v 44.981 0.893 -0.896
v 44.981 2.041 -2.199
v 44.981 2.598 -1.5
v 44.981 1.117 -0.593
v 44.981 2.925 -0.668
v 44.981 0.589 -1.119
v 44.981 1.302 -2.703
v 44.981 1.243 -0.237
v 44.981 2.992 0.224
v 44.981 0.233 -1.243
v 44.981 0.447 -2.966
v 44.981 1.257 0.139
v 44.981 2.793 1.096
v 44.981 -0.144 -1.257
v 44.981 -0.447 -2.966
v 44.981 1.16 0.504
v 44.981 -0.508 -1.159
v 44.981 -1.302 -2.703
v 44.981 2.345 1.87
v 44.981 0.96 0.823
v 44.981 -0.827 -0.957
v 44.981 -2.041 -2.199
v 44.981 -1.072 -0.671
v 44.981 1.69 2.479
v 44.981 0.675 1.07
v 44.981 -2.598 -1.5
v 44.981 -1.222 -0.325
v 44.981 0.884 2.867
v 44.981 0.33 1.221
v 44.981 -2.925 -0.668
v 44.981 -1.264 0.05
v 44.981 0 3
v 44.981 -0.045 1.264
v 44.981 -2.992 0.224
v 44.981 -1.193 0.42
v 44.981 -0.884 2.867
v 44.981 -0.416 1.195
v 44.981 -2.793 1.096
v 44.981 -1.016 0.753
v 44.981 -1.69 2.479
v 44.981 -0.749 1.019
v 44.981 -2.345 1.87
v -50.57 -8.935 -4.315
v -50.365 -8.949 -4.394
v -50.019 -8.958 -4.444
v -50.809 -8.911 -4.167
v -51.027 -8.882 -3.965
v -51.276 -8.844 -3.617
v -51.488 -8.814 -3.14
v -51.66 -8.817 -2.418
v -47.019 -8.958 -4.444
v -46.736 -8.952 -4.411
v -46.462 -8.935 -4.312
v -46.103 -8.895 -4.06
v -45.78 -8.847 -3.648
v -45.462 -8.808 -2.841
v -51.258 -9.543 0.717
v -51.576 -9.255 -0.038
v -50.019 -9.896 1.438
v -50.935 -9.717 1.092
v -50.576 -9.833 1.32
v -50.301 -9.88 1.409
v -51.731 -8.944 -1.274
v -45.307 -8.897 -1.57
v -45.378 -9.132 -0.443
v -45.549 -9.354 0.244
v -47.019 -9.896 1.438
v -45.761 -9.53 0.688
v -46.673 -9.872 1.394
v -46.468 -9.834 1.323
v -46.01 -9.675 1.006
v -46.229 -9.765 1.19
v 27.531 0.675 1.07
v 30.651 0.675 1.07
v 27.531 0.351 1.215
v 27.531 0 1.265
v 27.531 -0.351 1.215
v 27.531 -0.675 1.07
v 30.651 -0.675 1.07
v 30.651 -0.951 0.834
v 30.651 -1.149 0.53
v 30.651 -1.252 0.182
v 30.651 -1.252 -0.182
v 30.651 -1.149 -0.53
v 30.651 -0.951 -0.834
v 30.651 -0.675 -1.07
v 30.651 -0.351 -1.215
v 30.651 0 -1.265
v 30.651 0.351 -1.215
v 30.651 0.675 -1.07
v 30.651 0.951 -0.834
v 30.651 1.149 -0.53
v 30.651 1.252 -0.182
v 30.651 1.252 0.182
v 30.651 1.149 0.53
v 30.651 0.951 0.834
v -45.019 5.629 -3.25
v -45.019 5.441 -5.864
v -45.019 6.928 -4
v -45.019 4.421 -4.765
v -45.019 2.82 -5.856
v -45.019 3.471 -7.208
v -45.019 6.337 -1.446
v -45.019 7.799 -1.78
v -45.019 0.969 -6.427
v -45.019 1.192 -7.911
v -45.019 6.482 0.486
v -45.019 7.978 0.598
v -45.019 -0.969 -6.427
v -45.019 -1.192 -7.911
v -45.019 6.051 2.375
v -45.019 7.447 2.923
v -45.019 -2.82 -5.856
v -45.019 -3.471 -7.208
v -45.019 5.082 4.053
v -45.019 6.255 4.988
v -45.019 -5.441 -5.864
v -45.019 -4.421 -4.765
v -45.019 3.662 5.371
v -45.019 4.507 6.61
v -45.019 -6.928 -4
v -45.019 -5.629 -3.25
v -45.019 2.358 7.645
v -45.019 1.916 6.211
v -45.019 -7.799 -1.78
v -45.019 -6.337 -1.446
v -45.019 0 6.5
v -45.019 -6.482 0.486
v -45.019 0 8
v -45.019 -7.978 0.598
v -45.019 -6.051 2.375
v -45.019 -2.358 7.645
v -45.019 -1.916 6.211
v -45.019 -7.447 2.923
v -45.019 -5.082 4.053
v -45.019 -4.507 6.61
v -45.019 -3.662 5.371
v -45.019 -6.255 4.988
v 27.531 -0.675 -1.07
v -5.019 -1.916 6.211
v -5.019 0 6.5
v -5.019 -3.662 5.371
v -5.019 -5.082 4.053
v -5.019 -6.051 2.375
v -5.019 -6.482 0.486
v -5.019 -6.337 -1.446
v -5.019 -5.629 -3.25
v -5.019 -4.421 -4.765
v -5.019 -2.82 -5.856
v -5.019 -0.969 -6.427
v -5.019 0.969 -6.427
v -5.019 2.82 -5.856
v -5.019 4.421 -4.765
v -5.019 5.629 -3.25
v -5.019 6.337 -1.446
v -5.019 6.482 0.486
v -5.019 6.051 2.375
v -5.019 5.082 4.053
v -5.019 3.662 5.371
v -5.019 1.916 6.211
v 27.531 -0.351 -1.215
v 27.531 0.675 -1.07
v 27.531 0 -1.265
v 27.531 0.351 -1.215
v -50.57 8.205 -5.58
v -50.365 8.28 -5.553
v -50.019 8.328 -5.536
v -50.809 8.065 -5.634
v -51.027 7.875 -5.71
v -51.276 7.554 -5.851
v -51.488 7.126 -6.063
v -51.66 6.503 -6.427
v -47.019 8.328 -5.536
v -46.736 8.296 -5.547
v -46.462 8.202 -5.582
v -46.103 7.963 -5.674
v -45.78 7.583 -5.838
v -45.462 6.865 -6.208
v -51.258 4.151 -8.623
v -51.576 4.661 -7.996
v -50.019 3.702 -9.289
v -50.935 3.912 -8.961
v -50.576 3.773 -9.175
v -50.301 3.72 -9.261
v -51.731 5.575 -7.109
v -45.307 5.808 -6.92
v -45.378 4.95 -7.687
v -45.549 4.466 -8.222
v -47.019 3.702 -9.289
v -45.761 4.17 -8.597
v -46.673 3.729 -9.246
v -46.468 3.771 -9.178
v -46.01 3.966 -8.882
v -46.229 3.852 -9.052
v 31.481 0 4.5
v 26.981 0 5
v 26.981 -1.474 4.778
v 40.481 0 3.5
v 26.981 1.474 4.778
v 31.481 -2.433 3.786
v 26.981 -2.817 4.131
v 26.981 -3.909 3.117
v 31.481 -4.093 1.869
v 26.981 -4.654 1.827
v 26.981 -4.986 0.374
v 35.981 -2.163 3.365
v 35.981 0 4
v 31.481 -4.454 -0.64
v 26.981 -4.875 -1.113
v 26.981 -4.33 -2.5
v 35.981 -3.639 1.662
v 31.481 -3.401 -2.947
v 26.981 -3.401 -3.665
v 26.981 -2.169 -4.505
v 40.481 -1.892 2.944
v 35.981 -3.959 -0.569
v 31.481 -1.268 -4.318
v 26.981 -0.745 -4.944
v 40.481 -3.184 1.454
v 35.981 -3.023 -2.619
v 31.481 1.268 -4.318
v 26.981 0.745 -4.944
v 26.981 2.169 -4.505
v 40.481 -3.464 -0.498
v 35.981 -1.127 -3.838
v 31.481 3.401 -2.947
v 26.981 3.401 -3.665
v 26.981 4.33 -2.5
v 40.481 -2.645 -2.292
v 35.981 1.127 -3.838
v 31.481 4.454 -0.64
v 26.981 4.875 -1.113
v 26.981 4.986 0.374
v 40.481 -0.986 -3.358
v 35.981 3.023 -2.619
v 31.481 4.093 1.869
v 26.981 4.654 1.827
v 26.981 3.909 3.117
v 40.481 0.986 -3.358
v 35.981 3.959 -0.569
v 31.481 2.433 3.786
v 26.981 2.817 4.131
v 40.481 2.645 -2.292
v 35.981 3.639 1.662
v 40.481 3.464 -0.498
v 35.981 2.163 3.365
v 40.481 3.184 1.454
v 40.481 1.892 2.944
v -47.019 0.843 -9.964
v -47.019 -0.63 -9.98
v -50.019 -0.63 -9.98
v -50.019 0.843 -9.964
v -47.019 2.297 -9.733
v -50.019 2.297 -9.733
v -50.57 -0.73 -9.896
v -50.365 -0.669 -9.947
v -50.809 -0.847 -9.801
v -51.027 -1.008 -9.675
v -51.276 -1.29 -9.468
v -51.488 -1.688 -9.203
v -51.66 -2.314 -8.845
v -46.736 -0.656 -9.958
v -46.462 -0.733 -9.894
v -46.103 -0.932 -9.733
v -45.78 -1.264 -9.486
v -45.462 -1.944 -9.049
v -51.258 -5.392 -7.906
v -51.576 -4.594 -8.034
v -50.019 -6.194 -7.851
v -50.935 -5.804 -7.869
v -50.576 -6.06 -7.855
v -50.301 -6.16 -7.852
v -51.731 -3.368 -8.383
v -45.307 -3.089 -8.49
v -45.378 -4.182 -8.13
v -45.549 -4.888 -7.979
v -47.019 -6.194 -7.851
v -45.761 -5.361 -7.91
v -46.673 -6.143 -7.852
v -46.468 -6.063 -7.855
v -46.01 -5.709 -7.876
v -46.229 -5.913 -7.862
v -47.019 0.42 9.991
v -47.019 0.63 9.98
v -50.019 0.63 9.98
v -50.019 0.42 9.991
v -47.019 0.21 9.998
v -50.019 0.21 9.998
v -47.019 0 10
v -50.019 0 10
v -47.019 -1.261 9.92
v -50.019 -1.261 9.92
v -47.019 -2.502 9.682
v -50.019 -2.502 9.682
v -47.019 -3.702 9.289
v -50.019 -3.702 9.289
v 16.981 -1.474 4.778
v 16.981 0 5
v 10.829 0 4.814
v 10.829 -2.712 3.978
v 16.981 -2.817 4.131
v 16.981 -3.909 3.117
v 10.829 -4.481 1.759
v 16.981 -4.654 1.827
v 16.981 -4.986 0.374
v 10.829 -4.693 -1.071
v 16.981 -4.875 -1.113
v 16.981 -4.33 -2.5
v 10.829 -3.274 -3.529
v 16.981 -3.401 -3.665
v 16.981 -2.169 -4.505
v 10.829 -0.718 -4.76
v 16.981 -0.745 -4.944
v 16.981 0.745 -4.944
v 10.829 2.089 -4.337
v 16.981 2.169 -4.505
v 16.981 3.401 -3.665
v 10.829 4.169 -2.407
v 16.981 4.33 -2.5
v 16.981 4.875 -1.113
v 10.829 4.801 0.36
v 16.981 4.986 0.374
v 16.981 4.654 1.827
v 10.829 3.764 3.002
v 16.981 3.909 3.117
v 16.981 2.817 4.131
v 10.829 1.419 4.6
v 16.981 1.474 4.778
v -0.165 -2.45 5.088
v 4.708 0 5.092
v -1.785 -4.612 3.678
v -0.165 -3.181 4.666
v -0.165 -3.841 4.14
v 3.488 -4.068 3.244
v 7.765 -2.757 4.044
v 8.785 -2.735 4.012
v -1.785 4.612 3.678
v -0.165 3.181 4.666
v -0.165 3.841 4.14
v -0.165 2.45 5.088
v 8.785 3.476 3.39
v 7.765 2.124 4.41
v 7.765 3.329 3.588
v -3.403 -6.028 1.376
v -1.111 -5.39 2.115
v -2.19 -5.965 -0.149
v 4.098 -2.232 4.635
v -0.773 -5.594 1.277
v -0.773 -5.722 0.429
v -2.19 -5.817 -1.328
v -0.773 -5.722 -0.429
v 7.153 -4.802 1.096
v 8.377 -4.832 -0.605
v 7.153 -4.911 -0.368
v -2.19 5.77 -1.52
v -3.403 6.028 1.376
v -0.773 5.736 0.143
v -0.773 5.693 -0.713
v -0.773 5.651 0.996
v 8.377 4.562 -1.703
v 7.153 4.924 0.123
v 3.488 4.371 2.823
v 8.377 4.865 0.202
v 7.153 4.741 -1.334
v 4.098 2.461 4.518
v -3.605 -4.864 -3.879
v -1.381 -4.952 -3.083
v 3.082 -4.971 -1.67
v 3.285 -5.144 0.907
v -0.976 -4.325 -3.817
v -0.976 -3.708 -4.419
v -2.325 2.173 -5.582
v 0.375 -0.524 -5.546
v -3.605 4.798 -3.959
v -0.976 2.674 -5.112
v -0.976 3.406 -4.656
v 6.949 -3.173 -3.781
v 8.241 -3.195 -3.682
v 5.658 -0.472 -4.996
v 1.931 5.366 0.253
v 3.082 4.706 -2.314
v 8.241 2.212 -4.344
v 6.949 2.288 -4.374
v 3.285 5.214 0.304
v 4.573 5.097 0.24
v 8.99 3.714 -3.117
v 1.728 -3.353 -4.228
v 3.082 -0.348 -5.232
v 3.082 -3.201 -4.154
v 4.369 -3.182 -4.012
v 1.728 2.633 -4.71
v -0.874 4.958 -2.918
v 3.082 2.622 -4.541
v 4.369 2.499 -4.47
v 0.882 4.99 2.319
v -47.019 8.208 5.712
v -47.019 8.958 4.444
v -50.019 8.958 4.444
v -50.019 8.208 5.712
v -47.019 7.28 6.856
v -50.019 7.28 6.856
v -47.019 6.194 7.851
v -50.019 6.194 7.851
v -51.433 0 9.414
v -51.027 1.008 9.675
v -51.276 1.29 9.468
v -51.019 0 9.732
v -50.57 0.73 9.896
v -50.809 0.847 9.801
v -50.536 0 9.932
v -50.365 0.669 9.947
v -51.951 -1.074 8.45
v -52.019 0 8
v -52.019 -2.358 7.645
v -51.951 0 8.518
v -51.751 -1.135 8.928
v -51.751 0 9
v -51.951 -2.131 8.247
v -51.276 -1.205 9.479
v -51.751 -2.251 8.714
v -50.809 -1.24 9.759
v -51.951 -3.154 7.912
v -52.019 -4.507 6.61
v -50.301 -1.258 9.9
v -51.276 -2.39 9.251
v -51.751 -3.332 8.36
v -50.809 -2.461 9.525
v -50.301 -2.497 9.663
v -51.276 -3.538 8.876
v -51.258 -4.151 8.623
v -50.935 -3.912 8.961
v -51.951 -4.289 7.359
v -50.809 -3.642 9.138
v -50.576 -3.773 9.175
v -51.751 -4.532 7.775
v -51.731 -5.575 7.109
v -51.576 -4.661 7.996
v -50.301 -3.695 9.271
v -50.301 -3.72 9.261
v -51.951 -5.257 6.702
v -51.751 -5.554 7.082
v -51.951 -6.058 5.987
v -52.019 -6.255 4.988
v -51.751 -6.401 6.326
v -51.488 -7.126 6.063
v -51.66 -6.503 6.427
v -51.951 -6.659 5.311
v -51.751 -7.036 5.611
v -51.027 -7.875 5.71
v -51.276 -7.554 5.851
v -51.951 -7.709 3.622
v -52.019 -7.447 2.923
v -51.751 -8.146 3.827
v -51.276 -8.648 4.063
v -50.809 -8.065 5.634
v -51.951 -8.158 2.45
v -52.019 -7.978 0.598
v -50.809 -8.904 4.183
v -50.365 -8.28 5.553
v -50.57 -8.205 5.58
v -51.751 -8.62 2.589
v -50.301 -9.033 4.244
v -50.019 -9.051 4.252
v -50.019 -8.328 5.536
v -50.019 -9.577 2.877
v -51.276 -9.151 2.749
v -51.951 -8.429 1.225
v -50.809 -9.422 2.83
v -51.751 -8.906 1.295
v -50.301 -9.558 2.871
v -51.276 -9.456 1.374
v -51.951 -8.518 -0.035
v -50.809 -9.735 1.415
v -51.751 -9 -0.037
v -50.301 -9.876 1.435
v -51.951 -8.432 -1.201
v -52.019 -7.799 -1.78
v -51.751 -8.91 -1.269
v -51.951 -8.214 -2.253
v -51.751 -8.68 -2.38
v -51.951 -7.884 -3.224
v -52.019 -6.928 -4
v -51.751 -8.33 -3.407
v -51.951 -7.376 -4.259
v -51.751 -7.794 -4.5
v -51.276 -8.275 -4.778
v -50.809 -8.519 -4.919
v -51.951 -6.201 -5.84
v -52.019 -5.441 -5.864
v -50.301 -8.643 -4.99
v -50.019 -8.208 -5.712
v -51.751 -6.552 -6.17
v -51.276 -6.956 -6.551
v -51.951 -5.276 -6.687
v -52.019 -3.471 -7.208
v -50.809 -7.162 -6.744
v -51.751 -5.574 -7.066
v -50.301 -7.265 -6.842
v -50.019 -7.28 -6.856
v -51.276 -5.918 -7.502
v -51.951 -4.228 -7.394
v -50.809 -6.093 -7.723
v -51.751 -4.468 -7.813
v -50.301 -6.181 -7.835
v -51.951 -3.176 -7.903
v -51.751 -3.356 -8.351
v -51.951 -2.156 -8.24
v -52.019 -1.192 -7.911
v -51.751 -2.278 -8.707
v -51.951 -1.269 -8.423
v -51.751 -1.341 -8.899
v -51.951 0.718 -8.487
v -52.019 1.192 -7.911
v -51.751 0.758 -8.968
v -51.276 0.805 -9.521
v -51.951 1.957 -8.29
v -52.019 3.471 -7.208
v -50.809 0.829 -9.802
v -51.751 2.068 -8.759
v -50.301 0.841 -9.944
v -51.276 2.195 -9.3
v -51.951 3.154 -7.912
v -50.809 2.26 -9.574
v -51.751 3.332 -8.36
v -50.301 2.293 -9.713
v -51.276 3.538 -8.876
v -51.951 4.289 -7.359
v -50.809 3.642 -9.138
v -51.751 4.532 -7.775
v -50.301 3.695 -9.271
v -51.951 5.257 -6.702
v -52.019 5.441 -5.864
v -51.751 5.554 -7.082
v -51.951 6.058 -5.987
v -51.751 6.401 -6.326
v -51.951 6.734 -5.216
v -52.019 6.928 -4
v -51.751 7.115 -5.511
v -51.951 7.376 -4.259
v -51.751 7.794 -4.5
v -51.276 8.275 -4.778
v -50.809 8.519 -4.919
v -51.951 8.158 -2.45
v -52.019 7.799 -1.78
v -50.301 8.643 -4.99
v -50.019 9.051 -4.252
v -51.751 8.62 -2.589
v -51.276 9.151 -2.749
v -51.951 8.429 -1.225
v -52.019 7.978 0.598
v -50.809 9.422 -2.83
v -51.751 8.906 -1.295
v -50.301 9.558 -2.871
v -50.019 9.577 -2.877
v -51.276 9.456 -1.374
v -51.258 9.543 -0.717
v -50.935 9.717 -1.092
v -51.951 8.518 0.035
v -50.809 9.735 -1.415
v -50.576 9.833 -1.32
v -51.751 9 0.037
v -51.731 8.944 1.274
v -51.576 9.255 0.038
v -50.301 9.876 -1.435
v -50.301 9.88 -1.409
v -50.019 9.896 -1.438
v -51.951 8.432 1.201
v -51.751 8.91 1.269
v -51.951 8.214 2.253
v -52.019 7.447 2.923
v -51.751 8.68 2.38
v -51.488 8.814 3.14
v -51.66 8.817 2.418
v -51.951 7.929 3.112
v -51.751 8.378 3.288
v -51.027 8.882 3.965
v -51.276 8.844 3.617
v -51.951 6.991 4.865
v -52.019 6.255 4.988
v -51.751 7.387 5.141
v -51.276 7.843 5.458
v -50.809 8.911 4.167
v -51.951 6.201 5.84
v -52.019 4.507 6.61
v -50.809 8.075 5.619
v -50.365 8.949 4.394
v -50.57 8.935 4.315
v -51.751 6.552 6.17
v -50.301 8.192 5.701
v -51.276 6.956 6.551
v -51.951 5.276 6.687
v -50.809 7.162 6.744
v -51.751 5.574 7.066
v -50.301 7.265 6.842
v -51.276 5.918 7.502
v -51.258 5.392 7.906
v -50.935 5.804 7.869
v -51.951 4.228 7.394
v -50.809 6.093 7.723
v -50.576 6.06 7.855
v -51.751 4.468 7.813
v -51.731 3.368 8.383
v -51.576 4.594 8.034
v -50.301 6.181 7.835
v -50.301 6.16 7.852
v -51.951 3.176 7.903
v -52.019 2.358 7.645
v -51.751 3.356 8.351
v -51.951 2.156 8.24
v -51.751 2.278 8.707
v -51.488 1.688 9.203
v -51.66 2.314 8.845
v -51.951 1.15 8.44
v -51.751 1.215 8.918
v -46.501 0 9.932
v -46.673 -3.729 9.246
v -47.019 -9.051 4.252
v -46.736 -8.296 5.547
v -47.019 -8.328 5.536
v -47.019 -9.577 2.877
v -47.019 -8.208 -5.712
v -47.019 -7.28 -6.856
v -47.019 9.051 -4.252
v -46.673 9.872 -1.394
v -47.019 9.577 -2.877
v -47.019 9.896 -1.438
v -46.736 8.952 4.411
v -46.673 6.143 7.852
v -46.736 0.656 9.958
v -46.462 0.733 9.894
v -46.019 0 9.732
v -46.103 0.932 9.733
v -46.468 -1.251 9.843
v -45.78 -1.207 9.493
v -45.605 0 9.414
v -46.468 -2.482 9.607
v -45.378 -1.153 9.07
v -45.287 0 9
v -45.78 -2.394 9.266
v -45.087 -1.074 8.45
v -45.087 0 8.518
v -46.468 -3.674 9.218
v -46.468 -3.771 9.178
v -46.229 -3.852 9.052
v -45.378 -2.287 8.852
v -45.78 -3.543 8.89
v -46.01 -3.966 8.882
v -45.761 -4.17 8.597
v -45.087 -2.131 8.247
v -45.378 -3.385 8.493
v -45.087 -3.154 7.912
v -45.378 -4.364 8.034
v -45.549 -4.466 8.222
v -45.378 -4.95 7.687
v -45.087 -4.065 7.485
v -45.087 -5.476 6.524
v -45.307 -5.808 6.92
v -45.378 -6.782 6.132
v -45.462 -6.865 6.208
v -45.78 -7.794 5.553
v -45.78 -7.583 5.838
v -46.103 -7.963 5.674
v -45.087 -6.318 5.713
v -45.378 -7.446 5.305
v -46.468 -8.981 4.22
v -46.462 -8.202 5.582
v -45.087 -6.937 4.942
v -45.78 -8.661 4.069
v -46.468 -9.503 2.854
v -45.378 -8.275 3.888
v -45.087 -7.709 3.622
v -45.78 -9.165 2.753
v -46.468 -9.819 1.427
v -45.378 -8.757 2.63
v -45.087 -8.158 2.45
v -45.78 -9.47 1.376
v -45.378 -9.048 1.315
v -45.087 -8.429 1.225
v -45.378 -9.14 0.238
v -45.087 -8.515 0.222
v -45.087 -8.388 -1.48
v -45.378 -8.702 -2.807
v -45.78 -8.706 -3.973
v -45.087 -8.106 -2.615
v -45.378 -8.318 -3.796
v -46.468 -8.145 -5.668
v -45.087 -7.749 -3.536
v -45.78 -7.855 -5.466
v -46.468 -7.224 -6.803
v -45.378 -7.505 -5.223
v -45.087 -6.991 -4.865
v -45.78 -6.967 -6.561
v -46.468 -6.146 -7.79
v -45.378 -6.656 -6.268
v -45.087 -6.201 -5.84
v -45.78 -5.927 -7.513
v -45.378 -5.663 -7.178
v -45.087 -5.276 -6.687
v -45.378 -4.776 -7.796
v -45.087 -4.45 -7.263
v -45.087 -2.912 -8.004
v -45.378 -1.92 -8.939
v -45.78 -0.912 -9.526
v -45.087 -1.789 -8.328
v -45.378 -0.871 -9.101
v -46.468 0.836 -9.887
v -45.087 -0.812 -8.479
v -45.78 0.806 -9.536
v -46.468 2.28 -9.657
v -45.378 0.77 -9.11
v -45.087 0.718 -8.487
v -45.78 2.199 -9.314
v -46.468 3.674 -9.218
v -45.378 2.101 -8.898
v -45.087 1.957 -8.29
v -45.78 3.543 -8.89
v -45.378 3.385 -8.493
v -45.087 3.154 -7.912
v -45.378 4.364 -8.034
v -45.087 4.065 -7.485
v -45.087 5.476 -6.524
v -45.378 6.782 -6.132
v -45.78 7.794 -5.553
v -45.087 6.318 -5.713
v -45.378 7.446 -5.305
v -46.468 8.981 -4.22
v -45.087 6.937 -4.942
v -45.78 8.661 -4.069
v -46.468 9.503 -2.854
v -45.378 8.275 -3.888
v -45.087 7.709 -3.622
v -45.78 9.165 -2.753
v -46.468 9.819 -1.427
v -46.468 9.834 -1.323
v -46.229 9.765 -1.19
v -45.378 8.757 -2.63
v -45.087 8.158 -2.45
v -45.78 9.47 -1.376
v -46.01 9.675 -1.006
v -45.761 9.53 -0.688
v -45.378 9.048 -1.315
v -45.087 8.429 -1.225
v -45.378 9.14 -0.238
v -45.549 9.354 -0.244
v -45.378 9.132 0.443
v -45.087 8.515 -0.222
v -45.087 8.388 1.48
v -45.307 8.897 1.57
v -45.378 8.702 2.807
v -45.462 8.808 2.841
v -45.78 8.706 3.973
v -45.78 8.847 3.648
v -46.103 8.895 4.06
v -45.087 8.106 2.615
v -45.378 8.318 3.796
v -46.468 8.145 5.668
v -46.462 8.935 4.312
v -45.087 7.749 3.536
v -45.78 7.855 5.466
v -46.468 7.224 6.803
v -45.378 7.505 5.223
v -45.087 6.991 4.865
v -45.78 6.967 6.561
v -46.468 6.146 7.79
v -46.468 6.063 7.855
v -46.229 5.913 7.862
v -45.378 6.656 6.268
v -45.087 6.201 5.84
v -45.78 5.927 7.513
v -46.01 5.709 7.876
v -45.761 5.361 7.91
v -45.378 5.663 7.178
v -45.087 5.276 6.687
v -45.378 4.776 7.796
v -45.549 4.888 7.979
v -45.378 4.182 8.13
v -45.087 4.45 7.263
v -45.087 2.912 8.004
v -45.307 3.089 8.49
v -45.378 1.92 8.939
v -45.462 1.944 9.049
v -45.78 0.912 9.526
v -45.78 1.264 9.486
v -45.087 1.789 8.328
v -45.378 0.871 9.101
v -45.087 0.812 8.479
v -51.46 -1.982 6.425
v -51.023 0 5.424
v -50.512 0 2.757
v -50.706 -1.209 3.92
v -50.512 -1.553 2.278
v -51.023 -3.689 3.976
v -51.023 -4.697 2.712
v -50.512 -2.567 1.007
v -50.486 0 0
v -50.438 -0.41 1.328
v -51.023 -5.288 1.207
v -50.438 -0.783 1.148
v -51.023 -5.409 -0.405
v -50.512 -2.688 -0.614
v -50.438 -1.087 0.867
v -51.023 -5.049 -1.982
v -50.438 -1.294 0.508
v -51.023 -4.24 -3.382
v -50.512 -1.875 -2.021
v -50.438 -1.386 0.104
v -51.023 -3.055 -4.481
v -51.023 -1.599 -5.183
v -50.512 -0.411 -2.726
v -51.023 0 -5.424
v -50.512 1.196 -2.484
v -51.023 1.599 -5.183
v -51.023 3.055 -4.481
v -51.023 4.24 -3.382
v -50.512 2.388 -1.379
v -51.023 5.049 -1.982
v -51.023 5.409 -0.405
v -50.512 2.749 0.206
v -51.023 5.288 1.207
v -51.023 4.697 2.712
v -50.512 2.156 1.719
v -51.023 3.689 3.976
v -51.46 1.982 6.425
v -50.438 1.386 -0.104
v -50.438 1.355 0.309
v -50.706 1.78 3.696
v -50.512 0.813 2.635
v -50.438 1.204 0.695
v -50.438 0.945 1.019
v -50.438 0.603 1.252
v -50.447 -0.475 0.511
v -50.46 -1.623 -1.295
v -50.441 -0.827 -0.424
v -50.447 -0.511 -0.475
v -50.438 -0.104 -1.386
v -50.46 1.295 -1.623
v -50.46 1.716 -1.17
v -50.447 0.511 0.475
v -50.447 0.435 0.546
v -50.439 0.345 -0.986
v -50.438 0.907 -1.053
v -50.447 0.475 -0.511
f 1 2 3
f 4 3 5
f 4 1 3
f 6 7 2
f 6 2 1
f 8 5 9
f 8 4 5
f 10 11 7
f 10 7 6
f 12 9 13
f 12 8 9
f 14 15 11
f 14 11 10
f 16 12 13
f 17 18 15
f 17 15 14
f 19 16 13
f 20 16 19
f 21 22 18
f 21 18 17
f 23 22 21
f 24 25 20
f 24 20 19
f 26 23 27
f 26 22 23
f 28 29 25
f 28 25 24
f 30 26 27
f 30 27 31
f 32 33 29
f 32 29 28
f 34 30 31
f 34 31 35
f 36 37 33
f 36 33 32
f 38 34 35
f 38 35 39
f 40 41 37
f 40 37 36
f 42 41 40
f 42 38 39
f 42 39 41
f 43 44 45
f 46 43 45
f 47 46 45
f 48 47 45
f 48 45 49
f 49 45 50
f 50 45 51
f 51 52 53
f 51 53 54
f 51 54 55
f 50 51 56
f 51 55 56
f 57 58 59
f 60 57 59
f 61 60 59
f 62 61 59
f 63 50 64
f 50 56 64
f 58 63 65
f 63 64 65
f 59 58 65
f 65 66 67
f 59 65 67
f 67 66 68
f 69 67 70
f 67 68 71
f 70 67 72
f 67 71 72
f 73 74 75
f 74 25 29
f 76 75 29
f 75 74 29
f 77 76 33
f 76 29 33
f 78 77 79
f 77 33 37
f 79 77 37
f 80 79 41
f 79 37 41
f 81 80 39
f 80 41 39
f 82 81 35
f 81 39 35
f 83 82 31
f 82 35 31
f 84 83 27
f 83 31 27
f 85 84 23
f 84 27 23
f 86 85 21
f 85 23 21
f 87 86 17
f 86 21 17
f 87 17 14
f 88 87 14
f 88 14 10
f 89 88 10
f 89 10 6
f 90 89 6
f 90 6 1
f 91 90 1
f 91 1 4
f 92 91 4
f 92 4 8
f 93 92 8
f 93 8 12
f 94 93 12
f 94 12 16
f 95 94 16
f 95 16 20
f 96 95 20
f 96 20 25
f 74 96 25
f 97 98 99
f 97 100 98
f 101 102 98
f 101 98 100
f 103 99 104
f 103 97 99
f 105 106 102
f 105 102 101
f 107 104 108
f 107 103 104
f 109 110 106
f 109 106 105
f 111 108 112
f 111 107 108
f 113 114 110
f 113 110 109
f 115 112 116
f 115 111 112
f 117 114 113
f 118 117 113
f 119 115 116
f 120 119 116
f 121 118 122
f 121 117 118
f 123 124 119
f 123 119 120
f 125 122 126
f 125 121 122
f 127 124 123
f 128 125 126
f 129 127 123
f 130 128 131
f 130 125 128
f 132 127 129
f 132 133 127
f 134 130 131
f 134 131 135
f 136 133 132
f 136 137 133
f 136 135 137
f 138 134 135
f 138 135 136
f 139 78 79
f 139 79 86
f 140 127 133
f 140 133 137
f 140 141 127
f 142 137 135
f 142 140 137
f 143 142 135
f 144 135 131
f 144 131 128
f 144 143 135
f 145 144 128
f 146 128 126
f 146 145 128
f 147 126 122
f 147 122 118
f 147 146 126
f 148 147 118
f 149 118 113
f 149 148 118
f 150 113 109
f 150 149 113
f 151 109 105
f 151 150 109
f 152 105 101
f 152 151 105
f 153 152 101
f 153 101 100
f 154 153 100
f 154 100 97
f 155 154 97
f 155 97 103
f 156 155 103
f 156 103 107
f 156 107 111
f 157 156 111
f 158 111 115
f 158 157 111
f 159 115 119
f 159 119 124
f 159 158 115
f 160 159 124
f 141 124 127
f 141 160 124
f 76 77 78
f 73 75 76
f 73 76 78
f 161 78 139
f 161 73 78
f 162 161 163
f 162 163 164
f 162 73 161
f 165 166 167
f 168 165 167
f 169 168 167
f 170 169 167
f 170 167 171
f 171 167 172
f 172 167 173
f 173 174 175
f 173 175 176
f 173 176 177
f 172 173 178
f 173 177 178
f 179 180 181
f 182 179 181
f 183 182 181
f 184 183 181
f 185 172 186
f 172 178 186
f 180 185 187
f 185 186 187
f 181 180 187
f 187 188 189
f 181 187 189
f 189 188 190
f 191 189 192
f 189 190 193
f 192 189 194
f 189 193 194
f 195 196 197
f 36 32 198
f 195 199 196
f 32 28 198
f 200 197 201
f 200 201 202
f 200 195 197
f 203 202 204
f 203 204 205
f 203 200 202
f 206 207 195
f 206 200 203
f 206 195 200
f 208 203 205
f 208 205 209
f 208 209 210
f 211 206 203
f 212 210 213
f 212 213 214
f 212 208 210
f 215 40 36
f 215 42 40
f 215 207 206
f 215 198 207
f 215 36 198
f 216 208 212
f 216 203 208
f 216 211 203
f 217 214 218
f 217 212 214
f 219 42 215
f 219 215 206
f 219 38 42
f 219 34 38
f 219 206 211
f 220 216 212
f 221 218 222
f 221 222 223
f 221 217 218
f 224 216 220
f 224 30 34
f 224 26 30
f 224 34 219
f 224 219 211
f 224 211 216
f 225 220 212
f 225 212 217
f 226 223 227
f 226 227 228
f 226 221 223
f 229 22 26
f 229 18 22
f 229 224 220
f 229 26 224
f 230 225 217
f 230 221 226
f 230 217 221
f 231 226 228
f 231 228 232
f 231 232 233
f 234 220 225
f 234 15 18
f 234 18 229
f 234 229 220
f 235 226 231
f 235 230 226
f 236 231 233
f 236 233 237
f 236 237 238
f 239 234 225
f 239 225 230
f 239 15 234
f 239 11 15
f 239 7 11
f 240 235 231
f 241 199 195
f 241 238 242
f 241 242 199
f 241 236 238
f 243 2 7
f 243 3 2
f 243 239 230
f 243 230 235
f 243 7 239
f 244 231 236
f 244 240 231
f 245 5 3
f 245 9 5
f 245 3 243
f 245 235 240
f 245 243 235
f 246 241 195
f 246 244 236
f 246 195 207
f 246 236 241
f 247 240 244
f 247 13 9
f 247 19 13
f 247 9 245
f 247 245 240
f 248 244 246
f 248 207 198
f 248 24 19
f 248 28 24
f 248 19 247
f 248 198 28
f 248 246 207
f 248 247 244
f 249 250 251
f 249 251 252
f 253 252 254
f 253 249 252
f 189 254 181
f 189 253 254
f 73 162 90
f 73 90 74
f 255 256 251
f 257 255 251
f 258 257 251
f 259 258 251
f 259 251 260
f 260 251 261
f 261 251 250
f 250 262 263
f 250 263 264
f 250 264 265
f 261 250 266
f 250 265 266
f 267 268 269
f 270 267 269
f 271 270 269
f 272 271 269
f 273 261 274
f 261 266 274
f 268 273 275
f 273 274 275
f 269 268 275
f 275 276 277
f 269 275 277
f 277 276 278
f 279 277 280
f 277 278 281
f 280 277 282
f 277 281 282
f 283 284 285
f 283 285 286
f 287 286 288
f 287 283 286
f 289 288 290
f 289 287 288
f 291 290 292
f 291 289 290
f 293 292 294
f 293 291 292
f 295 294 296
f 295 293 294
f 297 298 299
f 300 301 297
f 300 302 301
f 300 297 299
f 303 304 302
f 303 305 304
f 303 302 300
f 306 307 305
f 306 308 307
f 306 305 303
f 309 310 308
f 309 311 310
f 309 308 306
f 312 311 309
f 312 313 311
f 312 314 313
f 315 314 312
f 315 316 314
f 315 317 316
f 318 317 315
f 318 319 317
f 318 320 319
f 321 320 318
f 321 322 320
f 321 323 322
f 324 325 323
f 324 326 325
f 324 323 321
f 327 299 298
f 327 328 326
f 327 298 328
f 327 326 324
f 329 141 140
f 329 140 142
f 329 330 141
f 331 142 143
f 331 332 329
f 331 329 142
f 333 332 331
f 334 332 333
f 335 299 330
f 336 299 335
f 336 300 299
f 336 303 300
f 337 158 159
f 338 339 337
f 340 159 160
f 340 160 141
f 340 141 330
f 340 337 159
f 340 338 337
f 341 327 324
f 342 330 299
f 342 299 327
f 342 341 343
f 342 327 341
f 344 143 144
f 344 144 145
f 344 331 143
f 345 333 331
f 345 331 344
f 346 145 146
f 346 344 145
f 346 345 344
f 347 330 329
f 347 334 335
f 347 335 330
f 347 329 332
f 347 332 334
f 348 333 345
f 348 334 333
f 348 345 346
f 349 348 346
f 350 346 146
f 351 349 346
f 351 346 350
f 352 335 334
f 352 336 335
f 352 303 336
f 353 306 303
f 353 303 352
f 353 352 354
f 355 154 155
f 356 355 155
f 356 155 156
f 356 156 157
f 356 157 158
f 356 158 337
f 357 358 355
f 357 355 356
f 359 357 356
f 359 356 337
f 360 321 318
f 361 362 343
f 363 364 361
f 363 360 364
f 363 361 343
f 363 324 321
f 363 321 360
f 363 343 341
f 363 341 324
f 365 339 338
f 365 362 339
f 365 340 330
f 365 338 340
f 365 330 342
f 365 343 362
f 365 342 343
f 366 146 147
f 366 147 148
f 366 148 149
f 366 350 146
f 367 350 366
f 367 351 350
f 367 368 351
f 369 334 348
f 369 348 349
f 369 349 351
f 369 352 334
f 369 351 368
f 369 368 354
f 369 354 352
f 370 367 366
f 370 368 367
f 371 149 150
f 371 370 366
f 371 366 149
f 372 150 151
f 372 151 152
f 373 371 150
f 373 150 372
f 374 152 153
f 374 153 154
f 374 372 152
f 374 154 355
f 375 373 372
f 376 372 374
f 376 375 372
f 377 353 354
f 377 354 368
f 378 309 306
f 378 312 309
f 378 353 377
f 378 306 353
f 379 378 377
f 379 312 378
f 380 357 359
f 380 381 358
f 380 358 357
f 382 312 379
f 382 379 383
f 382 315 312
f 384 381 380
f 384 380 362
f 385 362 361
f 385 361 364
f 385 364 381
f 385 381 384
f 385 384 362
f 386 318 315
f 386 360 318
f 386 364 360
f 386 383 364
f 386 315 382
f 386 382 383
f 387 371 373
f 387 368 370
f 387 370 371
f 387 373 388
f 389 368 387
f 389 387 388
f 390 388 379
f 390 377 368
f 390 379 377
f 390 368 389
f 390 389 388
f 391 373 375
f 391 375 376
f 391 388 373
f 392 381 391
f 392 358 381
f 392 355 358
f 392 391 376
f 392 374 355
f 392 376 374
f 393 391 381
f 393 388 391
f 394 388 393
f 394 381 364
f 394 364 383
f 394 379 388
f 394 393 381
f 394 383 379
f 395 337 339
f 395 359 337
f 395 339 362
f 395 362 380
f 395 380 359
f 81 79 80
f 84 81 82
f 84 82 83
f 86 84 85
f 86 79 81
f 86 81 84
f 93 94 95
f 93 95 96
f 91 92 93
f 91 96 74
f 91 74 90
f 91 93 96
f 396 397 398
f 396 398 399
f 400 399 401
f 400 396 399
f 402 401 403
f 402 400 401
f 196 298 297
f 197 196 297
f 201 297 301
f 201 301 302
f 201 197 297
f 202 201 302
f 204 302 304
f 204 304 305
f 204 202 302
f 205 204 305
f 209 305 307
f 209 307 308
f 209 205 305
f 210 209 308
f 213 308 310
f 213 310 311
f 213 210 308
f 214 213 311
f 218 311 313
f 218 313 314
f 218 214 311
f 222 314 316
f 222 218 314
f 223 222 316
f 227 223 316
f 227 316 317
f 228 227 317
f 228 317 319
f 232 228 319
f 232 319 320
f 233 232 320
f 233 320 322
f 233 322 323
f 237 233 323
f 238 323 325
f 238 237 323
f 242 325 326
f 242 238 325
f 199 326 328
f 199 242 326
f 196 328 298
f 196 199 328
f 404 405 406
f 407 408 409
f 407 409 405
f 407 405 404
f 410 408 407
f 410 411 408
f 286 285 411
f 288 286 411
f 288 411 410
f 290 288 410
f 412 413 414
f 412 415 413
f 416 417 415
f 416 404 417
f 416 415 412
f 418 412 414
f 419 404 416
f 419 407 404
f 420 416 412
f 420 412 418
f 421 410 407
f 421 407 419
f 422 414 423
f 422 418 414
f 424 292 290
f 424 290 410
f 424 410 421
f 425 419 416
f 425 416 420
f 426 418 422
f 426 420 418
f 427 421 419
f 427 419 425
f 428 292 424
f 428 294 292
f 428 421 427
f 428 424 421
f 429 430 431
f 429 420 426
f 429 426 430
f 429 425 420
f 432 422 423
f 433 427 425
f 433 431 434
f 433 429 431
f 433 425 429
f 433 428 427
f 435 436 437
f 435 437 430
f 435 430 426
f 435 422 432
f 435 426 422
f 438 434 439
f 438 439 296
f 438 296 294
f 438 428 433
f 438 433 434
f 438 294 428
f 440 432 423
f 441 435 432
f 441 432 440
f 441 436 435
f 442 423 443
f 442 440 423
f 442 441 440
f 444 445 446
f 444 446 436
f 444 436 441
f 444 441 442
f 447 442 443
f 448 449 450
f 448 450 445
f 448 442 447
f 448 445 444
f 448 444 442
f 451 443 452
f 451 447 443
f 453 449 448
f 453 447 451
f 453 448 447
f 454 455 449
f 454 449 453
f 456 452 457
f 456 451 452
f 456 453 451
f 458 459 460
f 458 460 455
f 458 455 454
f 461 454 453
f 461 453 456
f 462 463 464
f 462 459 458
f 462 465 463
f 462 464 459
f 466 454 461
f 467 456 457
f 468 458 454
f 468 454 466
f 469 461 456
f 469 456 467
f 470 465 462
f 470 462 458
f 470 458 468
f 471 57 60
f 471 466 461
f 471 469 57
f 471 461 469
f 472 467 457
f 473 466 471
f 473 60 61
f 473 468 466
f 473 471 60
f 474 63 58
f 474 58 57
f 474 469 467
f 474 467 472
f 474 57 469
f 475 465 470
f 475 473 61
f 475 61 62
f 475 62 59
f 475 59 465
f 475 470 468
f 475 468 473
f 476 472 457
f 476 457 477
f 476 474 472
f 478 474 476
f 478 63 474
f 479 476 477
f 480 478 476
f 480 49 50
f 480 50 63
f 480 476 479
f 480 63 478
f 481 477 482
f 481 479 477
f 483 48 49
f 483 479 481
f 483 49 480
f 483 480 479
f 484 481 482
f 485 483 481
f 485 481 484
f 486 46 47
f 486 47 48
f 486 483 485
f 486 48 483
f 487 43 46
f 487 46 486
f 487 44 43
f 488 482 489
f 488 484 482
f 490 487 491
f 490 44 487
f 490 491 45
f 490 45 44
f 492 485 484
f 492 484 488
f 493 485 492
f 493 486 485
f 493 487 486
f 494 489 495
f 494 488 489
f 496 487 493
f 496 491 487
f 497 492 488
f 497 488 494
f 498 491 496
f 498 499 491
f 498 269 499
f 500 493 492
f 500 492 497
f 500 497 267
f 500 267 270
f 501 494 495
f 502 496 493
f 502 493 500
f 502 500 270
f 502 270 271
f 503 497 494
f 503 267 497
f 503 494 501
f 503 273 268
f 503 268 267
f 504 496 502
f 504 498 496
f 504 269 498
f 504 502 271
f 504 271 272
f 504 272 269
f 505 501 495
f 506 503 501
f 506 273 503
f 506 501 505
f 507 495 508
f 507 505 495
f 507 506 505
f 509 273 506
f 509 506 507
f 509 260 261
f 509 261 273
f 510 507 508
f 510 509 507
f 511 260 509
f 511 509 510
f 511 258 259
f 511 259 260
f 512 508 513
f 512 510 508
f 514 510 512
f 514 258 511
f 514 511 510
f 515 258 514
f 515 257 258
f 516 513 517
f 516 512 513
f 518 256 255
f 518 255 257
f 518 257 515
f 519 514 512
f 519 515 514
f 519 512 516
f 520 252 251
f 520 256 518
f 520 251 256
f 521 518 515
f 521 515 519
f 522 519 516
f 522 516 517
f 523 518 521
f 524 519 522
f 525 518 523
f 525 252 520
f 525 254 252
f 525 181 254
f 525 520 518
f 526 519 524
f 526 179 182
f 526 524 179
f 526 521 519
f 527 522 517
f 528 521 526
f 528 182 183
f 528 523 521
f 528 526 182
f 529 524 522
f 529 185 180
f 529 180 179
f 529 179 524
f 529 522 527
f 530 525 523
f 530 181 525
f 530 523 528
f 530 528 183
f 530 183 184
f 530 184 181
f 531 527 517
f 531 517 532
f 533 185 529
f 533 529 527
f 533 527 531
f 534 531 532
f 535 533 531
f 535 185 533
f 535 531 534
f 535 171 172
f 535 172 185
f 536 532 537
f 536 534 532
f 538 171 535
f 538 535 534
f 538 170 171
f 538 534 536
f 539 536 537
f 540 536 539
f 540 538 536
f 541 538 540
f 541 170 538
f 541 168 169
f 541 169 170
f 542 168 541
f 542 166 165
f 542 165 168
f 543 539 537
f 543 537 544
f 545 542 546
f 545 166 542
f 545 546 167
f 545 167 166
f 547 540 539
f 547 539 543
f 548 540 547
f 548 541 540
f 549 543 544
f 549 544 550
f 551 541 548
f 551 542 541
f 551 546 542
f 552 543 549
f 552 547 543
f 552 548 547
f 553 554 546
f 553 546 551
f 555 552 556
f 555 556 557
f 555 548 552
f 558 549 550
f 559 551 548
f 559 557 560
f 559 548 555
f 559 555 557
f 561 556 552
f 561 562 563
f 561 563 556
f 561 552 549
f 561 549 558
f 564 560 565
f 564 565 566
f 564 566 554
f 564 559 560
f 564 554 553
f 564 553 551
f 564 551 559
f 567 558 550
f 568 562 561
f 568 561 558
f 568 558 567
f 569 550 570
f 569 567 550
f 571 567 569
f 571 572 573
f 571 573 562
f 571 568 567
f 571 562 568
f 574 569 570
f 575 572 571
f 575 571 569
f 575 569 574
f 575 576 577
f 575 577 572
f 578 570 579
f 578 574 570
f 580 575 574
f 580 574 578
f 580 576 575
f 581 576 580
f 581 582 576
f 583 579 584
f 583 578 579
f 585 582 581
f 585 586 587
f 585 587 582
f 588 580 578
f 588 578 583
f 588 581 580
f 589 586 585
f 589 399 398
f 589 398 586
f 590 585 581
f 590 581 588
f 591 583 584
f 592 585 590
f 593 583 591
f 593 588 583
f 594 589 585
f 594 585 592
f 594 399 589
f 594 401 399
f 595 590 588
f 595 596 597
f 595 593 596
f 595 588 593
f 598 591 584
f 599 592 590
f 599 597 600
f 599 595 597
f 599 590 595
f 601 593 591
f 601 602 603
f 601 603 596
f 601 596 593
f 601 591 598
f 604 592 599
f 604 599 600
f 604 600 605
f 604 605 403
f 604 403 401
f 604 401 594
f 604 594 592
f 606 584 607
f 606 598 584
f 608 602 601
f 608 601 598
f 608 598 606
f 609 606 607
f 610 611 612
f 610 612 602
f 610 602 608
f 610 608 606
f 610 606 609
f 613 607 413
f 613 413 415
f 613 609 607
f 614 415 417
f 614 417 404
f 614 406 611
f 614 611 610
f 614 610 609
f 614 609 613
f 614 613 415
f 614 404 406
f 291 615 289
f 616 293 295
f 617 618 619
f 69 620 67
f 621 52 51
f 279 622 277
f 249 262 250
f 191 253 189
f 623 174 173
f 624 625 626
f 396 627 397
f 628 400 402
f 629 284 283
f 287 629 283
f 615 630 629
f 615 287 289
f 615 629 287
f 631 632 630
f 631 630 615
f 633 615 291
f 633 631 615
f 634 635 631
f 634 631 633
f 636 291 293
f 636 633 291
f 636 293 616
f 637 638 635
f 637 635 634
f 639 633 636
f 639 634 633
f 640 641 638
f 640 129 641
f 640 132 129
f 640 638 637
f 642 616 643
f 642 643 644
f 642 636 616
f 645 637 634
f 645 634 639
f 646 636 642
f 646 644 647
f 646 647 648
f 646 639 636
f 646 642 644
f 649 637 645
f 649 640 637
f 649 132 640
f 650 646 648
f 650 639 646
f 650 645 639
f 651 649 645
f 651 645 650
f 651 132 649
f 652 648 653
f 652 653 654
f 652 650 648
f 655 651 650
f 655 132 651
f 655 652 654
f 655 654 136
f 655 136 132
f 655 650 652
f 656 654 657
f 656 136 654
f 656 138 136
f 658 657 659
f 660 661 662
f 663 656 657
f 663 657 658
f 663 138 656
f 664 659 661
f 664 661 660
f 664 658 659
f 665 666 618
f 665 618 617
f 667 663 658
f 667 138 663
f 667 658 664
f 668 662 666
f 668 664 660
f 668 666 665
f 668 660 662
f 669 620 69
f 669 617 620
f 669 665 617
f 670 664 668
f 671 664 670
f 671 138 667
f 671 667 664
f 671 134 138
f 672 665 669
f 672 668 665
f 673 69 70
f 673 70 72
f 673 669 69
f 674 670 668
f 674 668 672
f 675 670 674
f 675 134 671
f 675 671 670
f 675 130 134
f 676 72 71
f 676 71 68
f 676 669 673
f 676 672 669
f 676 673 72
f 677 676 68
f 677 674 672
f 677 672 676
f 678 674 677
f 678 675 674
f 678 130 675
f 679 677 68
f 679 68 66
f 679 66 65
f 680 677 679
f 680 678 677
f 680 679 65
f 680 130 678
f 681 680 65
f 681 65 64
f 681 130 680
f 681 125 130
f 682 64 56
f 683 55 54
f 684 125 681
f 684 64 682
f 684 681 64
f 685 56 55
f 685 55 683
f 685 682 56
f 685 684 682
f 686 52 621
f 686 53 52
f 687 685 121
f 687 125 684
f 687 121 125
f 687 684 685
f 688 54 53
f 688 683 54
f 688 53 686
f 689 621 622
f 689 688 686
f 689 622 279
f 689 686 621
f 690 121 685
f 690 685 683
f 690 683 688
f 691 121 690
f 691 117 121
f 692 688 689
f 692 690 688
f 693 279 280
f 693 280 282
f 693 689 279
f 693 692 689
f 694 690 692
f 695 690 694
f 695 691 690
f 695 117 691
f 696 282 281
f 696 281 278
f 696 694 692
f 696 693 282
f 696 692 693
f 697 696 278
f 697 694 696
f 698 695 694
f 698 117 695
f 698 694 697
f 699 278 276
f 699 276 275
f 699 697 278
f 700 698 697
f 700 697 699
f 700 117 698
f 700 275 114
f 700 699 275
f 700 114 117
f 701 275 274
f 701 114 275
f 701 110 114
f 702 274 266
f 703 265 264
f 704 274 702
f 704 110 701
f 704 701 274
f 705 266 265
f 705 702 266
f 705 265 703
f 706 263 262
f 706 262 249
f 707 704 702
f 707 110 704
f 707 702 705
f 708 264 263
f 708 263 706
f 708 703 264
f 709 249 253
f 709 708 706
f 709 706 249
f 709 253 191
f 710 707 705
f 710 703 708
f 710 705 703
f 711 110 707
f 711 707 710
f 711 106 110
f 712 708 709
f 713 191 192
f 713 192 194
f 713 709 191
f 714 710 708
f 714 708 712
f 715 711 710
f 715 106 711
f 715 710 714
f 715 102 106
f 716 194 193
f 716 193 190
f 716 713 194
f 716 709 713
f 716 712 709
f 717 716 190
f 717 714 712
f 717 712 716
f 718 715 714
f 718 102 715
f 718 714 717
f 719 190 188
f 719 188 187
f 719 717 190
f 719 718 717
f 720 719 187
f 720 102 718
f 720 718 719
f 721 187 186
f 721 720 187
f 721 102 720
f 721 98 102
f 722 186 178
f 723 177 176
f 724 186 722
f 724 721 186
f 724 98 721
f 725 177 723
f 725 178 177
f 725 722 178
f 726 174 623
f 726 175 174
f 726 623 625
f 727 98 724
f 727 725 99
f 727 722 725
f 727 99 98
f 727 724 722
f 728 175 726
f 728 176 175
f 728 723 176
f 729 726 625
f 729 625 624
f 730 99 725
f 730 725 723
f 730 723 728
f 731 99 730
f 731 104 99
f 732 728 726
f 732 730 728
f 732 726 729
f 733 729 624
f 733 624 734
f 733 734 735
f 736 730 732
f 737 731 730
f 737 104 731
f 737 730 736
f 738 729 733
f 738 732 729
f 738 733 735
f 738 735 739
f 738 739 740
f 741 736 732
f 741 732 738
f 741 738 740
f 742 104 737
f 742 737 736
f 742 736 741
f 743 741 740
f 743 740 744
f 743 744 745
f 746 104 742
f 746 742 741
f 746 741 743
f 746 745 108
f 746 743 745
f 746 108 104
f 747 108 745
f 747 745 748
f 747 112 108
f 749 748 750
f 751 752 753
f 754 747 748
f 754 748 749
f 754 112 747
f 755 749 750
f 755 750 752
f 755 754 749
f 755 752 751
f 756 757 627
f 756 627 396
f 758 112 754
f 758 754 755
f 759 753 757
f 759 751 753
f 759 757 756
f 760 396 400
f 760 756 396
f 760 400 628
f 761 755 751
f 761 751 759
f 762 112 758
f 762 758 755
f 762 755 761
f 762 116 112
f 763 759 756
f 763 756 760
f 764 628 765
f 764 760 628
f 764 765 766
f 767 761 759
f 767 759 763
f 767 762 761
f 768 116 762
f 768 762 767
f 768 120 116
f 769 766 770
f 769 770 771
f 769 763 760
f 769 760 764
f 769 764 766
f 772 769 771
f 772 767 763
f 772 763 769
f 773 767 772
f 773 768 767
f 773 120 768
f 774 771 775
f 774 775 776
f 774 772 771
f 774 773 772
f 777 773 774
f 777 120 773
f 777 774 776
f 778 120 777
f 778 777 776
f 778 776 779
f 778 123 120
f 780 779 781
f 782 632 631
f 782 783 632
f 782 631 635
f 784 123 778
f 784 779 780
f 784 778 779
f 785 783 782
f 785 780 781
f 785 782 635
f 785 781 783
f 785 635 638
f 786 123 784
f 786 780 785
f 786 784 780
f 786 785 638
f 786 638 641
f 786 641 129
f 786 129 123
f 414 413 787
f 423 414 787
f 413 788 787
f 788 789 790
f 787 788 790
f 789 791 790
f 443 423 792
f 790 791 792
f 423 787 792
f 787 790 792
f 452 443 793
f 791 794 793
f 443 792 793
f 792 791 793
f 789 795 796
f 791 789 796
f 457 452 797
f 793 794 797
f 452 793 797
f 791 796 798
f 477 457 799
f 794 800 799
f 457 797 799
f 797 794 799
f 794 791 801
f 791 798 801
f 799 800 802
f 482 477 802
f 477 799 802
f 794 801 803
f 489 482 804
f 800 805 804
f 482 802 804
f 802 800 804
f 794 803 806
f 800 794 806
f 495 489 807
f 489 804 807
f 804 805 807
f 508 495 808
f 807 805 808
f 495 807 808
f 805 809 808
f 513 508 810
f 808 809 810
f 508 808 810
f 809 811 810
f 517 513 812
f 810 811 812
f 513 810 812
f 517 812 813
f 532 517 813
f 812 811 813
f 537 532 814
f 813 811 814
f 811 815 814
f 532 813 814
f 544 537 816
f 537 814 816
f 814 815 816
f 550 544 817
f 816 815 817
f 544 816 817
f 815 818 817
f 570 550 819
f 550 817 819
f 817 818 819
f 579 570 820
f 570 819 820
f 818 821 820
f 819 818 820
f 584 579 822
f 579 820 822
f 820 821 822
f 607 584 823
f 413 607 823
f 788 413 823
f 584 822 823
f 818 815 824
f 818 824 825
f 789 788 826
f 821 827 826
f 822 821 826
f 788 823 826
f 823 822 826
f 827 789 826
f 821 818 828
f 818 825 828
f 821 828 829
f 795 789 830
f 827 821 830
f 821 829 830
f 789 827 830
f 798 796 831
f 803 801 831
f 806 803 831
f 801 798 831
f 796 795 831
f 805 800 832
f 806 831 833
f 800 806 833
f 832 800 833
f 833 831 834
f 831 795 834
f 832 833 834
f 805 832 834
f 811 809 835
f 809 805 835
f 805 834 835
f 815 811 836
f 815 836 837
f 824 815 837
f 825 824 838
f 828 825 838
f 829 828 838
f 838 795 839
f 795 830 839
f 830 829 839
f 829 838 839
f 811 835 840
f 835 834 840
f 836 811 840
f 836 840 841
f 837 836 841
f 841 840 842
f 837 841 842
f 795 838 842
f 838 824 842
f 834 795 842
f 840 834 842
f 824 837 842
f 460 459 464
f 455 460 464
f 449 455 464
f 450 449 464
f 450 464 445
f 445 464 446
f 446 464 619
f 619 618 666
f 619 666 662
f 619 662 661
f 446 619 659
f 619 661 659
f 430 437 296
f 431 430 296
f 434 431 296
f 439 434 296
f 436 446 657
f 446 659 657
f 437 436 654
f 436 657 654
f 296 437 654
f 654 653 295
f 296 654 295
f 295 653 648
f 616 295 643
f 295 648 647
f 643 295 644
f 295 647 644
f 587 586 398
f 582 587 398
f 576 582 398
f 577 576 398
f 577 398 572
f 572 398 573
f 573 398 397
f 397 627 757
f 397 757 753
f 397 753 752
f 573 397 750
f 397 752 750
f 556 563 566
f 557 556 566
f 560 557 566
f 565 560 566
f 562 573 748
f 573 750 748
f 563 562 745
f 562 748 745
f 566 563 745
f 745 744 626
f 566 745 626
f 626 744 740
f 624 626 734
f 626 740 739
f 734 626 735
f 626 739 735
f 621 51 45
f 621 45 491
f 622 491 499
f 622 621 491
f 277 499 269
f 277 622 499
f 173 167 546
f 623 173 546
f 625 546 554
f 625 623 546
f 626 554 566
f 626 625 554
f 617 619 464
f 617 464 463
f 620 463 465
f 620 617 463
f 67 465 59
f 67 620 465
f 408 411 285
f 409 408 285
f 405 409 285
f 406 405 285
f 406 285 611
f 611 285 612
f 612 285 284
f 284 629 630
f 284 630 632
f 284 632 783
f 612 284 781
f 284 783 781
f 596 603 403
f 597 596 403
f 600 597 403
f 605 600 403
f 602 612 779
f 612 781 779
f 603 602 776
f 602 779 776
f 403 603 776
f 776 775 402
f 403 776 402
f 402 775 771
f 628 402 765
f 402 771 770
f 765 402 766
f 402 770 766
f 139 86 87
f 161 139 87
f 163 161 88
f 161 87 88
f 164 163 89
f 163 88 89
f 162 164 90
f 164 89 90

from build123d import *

# Parameters (mm, degrees)
CUT_EXTRUDE1_DEPTH = 14.329999999999998
CUT_EXTRUDE2_START = -14.33
CUT_EXTRUDE2_DEPTH = 3.12
SKETCH3_R          = 8.878997023709873
CUT_EXTRUDE3_DEPTH = 10
CIRPATTERN1_COUNT  = 6


with BuildPart() as part:
    # Sketch1 → Revolve1 (revolve)
    with BuildSketch(Plane.XY, mode=Mode.PRIVATE) as revolve1_sk:
        with BuildLine():
            Line((0, 0), (-50.4860955695321, 0))
            add(Edge.make_bspline(
                [(-52.01874999999999, 7.99999999999998), (-50.16036303063599, 4.2035390390822025), (-50.4860955695321, 0)],
                knots=[0, 0, 0, 1, 1, 1], degree=2))
            ThreePointArc((-52.01874999999999, 7.99999999999998), (-51.43296356237308, 9.414213562373089), (-50.018749999999976, 9.999999999999993))
            Line((-50.018749999999976, 9.999999999999993), (-47.018750000000004, 9.999999999999993))
            ThreePointArc((-47.018750000000004, 9.999999999999993), (-45.6045364376269, 9.414213562373089), (-45.01874999999999, 7.99999999999998))
            Line((-45.01874999999999, 7.99999999999998), (-45.01874999999999, 6.499999999999996))
            Line((-45.01874999999999, 6.499999999999996), (-5.018749999999988, 6.499999999999994))
            add(Edge.make_bspline(
                [(-5.018749999999988, 6.499999999999994), (5.878733880748029, 4.24822033263461), (16.98125000000001, 5.000000000000002)],
                knots=[0, 0, 0, 1, 1, 1], degree=2))
            Line((16.98125000000001, 5.000000000000002), (26.981250000000014, 5.000000000000003))
            Line((26.981250000000014, 5.000000000000003), (44.98125000000002, 3.0000000000000058))
            Line((44.98125000000002, 3.0000000000000058), (44.98125000000002, 5.51e-15))
            Line((44.98125000000002, 5.51e-15), (0, 0))
        make_face()
    revolve(revolve1_sk.sketch.rotate(Axis((-50.4860955695321, 0, 0), (1, 0, 0)), 90), axis=Axis((-50.4860955695321, 0, 0), (1, 0, 0)))

    # Sketch2 → Cut-Extrude1 (cut)
    with BuildSketch(Plane(origin=(44.98125000000002, 0, 0), x_dir=(0, 0, -1), z_dir=(1, 0, 0))):
        with BuildLine():
            ThreePointArc((1.0698598038995577, 0.6749999999999999), (8e-17, 1.265), (-1.0698598038995573, 0.6750000000000003))
            Line((-1.0698598038995575, 0.675), (1.0698598038995575, 0.675))
        make_face()
        with BuildLine():
            Line((1.0698598038995575, -0.675), (-1.0698598038995575, -0.675))
            ThreePointArc((-1.0698598038995577, -0.6749999999999999), (-2.3e-16, -1.265), (1.0698598038995577, -0.6749999999999998))
        make_face()
        with BuildLine():
            ThreePointArc((-1.0698598038995573, 0.6750000000000003), (-1.265, 1.5e-16), (-1.0698598038995577, -0.6749999999999999))
            Line((-1.0698598038995575, -0.675), (1.0698598038995575, -0.675))
            ThreePointArc((1.0698598038995577, -0.6749999999999998), (1.2152361194296644, -0.3513206143019937), (1.265, -3.1e-16))
            ThreePointArc((1.265, 0), (1.2152361194296646, 0.351320614301993), (1.0698598038995577, 0.6749999999999999))
            Line((1.0698598038995575, 0.675), (-1.0698598038995575, 0.675))
        make_face()
    extrude(amount=-CUT_EXTRUDE1_DEPTH, mode=Mode.SUBTRACT)

    # Sketch2<3> → Cut-Extrude2 (cut)
    with BuildSketch(Plane(origin=(44.98125000000002, 0, 0), x_dir=(0, 0, -1), z_dir=(1, 0, 0)).offset(CUT_EXTRUDE2_START)):
        with BuildLine():
            ThreePointArc((-1.0698598038995573, 0.6750000000000003), (-1.265, 1.5e-16), (-1.0698598038995577, -0.6749999999999999))
            Line((-1.0698598038995575, -0.675), (1.0698598038995575, -0.675))
            ThreePointArc((1.0698598038995577, -0.6749999999999998), (1.2152361194296644, -0.3513206143019937), (1.265, -3.1e-16))
            ThreePointArc((1.265, 0), (1.2152361194296646, 0.351320614301993), (1.0698598038995577, 0.6749999999999999))
            Line((1.0698598038995575, 0.675), (-1.0698598038995575, 0.675))
        make_face()
    extrude(amount=-CUT_EXTRUDE2_DEPTH, mode=Mode.SUBTRACT)

    # Sketch3 → Cut-Extrude3 (cut)
    with BuildSketch(Plane(origin=(-45.01874999999999, 0, 0), x_dir=(0, 0, -1), z_dir=(1, 0, 0))):
        with Locations((16.727573230529202, -6.401670880419097)):
            Circle(SKETCH3_R)
    cut_extrude3 = extrude(amount=-CUT_EXTRUDE3_DEPTH, mode=Mode.SUBTRACT)

    # CirPattern1: Cut-Extrude3 ×6 about axis
    cirpattern1_axis = Axis((0, -1.97e-14, 8.2e-15), (1, 0, 0))
    for i in range(1, CIRPATTERN1_COUNT):
        add(cut_extrude3.rotate(cirpattern1_axis, i * 360 / CIRPATTERN1_COUNT), mode=Mode.SUBTRACT)


solid = part.part
